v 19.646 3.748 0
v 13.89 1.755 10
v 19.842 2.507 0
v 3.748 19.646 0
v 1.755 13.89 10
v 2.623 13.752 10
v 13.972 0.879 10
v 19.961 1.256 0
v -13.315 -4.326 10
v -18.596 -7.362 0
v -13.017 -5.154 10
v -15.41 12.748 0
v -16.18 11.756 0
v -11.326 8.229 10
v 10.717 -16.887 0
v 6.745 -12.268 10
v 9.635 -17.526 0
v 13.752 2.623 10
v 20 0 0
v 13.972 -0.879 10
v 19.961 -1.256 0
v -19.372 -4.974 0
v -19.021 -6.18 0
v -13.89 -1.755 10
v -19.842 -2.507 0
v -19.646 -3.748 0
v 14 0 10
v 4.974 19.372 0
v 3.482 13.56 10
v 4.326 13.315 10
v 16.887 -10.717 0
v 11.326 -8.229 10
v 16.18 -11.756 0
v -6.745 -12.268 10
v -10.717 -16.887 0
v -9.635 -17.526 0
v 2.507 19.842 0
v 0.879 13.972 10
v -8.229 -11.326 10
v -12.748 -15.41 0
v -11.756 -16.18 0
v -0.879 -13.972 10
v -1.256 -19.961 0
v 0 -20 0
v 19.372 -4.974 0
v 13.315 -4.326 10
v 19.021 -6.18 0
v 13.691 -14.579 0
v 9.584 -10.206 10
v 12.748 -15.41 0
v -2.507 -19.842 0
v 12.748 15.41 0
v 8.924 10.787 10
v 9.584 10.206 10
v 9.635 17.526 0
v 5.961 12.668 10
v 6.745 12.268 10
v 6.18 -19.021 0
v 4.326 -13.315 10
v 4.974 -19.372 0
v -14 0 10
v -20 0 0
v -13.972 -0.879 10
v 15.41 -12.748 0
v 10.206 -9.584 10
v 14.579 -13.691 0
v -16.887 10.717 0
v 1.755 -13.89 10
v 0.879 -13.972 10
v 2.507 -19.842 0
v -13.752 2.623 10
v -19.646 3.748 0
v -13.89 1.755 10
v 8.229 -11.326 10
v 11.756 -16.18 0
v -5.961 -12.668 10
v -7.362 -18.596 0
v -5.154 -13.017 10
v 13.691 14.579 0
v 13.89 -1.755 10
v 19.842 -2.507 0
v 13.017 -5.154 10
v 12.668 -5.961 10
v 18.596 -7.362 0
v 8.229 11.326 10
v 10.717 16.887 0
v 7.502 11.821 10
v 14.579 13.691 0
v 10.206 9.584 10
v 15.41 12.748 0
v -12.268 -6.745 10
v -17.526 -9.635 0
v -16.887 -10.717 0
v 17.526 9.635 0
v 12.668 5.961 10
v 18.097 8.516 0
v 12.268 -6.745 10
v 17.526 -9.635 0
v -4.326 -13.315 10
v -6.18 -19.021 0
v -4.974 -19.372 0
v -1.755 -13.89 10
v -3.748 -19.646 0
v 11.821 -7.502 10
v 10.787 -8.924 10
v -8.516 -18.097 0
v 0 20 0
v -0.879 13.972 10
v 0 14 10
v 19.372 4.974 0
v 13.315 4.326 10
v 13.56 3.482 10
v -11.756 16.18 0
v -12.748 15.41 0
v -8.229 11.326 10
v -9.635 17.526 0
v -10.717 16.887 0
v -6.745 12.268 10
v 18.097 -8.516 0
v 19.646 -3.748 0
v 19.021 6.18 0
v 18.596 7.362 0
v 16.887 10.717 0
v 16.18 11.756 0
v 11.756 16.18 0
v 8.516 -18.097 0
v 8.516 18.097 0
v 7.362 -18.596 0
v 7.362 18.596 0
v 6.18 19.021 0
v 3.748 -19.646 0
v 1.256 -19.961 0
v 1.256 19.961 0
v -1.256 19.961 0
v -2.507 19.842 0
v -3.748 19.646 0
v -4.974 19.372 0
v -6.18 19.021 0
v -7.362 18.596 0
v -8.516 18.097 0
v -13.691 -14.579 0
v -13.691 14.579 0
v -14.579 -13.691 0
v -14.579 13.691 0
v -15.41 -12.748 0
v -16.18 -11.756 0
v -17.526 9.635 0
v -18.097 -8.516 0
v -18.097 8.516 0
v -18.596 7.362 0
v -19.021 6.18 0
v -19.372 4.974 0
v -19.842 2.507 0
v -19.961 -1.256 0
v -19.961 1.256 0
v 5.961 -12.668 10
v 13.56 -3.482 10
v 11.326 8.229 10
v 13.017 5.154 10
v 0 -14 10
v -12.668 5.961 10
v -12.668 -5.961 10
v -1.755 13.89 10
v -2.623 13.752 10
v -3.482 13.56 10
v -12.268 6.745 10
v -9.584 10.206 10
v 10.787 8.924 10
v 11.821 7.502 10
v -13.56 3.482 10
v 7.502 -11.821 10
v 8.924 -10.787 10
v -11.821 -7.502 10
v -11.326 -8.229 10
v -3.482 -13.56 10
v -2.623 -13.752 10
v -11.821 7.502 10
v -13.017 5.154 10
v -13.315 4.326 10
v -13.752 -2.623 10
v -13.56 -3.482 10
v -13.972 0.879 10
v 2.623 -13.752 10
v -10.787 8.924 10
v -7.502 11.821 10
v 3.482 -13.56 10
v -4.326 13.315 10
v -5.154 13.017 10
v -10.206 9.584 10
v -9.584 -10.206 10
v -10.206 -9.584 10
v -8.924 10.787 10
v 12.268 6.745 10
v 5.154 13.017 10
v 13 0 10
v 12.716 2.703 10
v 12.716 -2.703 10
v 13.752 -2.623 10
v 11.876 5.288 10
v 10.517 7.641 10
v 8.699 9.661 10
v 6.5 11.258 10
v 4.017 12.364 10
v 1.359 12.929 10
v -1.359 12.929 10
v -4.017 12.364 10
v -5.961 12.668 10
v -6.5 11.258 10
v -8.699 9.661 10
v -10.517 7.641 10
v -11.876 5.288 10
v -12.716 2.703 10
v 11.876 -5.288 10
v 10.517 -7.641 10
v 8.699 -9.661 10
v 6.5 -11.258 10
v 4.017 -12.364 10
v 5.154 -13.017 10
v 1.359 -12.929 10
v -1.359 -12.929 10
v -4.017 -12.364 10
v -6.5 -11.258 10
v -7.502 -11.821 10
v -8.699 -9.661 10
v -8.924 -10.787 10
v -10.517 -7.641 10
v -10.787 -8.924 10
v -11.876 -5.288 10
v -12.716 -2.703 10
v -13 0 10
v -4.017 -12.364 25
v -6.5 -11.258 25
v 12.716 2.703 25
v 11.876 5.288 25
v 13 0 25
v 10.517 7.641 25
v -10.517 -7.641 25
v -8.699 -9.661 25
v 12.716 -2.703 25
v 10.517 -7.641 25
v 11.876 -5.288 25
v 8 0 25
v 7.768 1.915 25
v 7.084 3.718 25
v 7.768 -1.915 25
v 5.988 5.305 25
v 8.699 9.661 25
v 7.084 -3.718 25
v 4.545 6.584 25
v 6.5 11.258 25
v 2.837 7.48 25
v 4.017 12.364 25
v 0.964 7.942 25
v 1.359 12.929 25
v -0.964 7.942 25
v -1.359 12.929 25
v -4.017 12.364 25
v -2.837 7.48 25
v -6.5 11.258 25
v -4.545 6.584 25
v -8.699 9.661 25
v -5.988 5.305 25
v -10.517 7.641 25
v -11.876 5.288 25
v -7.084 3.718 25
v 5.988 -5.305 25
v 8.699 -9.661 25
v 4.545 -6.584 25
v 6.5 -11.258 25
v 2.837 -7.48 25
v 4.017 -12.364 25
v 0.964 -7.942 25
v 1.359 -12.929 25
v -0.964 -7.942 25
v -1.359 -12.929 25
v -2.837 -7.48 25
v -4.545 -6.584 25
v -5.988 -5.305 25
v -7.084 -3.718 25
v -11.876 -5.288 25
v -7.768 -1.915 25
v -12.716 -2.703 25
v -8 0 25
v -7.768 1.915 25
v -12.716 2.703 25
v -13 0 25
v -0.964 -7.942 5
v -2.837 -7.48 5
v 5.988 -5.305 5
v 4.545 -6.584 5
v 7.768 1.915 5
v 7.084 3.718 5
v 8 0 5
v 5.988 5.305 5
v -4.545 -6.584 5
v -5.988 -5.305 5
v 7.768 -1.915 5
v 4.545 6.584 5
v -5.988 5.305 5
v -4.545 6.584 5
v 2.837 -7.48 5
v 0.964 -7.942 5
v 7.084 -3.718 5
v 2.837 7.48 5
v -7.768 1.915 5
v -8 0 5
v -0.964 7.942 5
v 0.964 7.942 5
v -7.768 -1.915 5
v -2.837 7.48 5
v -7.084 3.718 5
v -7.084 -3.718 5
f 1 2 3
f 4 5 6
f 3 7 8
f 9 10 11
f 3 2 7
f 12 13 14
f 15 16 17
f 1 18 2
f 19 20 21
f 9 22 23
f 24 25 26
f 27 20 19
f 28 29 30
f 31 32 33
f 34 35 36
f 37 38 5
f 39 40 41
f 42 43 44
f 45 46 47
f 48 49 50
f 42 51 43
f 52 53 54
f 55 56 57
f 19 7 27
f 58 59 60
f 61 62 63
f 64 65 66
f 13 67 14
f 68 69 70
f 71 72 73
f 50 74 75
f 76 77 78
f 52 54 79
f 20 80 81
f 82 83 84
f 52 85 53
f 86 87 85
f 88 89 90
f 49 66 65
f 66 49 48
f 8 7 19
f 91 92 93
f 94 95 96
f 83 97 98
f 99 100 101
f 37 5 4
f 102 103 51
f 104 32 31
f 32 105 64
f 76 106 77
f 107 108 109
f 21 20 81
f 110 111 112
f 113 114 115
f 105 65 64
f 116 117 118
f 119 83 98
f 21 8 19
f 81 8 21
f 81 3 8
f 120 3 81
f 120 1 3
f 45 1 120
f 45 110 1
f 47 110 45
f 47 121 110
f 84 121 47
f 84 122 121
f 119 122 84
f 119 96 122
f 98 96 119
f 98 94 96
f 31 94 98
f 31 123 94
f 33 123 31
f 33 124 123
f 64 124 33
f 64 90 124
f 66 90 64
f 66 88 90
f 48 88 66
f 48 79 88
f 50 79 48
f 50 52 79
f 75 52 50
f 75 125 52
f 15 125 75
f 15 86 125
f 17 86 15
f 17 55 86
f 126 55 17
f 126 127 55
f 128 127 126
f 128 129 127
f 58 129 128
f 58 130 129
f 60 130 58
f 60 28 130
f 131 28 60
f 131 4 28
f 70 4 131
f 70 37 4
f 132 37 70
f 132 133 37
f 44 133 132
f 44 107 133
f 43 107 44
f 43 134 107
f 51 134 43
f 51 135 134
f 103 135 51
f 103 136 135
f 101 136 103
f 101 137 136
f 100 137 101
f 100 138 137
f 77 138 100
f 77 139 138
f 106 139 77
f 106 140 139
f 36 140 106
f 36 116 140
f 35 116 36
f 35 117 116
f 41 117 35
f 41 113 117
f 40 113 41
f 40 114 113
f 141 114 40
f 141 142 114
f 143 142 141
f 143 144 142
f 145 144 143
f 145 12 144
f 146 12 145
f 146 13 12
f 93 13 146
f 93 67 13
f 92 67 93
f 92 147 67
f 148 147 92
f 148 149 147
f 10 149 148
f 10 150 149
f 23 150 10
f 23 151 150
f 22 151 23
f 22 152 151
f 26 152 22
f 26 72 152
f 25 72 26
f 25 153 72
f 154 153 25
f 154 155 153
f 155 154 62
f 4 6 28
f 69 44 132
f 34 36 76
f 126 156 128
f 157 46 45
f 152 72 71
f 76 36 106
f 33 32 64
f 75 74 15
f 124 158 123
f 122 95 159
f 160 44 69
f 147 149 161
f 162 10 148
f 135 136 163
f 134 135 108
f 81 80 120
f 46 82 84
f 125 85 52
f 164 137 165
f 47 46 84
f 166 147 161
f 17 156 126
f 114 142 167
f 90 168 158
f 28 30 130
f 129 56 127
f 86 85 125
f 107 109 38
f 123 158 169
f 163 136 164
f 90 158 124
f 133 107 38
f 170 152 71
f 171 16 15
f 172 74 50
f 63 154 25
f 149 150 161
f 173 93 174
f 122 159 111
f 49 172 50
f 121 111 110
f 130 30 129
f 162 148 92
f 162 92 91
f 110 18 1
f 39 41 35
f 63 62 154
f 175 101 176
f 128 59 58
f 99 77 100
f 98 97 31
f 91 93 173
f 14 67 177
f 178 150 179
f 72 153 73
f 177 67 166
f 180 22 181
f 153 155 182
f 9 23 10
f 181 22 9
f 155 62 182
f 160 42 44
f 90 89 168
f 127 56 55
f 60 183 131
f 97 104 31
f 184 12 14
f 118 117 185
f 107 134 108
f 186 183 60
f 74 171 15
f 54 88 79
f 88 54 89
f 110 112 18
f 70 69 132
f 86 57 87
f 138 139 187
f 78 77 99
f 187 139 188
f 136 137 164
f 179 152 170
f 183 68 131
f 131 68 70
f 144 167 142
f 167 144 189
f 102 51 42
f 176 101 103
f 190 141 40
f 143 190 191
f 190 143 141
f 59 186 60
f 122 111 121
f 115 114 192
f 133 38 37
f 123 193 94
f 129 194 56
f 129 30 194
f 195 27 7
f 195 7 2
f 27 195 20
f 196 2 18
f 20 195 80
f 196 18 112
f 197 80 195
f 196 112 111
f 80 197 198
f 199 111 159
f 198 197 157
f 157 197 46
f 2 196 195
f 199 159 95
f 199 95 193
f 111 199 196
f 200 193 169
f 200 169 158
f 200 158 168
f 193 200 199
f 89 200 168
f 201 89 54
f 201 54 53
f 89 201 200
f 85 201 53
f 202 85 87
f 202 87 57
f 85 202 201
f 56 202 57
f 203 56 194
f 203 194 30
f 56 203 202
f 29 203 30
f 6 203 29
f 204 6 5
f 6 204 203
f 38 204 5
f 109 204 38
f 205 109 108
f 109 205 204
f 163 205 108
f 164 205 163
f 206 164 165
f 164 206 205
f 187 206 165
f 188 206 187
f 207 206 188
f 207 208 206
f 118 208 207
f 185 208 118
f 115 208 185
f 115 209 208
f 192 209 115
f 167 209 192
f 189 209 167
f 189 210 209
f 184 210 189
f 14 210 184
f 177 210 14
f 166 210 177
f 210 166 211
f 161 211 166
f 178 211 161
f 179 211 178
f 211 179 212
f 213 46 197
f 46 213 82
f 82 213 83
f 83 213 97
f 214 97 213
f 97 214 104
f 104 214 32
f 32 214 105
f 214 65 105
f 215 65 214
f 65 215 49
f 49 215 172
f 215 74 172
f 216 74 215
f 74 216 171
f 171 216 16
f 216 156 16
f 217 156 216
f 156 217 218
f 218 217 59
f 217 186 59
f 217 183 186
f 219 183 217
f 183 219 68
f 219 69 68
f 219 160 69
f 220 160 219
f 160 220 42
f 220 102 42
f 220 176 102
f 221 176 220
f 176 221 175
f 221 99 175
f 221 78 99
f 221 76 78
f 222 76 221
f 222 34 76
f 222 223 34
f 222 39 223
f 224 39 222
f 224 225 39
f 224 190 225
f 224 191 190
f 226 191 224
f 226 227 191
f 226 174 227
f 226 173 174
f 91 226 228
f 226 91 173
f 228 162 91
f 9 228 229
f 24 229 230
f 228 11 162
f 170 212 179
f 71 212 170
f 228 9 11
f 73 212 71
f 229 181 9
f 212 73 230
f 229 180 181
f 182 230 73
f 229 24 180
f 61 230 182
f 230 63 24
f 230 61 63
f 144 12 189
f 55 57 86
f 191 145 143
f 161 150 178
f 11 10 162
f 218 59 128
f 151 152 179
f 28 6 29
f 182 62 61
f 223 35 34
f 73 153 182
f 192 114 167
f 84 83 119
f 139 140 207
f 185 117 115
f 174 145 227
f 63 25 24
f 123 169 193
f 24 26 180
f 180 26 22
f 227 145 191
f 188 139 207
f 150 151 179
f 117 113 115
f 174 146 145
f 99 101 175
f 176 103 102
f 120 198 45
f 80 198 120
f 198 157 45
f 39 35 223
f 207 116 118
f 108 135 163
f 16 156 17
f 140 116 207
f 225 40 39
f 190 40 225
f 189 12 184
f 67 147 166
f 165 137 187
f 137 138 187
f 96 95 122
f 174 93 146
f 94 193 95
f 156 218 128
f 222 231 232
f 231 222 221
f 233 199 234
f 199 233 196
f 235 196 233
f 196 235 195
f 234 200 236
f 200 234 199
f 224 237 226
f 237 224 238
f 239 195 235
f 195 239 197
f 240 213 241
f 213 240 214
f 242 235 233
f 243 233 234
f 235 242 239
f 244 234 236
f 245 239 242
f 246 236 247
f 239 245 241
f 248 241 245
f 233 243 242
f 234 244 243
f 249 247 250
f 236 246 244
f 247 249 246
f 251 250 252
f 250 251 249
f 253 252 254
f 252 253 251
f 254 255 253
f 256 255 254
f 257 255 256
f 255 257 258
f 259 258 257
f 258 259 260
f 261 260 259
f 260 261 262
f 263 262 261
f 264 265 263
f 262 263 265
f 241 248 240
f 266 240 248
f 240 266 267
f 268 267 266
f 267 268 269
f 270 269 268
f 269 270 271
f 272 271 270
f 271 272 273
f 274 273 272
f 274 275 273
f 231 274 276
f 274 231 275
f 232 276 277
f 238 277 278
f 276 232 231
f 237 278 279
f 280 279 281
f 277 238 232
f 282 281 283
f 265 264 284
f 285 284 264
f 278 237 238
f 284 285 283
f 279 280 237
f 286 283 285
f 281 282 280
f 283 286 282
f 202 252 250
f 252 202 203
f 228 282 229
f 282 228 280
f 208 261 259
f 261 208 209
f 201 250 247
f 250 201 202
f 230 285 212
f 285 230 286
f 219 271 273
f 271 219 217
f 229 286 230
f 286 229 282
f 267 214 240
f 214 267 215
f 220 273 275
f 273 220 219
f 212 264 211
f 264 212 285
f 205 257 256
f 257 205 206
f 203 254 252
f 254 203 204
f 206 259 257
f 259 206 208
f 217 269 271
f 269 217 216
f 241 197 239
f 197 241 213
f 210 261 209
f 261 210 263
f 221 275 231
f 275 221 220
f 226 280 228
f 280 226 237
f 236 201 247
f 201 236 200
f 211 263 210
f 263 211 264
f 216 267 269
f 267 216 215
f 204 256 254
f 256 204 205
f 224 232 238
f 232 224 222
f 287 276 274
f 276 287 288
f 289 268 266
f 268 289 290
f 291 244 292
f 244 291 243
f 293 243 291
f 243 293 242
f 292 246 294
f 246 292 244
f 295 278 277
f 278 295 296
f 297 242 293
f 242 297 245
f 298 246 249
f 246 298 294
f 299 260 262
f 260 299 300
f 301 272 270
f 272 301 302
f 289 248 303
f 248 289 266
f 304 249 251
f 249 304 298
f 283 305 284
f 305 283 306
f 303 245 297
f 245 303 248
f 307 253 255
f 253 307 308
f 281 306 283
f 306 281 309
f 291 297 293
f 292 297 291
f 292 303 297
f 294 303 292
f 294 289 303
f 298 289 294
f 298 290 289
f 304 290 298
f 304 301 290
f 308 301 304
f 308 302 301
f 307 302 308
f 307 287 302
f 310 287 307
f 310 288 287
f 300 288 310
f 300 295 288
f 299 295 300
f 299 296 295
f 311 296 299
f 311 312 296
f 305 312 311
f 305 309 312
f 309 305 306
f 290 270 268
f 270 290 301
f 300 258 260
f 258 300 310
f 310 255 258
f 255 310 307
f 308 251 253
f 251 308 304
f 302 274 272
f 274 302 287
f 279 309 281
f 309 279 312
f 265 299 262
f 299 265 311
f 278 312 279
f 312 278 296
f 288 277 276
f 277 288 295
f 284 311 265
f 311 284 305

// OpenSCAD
difference() {
    union(){
        linear_extrude(10,center=false,scale=[0.7,0.7]) circle(r=20,$fn=100);
        translate([0,0,5]) cylinder(20,13,13);
    }
    translate([0,0,5]) color("red") cylinder(20,8,8);
}
